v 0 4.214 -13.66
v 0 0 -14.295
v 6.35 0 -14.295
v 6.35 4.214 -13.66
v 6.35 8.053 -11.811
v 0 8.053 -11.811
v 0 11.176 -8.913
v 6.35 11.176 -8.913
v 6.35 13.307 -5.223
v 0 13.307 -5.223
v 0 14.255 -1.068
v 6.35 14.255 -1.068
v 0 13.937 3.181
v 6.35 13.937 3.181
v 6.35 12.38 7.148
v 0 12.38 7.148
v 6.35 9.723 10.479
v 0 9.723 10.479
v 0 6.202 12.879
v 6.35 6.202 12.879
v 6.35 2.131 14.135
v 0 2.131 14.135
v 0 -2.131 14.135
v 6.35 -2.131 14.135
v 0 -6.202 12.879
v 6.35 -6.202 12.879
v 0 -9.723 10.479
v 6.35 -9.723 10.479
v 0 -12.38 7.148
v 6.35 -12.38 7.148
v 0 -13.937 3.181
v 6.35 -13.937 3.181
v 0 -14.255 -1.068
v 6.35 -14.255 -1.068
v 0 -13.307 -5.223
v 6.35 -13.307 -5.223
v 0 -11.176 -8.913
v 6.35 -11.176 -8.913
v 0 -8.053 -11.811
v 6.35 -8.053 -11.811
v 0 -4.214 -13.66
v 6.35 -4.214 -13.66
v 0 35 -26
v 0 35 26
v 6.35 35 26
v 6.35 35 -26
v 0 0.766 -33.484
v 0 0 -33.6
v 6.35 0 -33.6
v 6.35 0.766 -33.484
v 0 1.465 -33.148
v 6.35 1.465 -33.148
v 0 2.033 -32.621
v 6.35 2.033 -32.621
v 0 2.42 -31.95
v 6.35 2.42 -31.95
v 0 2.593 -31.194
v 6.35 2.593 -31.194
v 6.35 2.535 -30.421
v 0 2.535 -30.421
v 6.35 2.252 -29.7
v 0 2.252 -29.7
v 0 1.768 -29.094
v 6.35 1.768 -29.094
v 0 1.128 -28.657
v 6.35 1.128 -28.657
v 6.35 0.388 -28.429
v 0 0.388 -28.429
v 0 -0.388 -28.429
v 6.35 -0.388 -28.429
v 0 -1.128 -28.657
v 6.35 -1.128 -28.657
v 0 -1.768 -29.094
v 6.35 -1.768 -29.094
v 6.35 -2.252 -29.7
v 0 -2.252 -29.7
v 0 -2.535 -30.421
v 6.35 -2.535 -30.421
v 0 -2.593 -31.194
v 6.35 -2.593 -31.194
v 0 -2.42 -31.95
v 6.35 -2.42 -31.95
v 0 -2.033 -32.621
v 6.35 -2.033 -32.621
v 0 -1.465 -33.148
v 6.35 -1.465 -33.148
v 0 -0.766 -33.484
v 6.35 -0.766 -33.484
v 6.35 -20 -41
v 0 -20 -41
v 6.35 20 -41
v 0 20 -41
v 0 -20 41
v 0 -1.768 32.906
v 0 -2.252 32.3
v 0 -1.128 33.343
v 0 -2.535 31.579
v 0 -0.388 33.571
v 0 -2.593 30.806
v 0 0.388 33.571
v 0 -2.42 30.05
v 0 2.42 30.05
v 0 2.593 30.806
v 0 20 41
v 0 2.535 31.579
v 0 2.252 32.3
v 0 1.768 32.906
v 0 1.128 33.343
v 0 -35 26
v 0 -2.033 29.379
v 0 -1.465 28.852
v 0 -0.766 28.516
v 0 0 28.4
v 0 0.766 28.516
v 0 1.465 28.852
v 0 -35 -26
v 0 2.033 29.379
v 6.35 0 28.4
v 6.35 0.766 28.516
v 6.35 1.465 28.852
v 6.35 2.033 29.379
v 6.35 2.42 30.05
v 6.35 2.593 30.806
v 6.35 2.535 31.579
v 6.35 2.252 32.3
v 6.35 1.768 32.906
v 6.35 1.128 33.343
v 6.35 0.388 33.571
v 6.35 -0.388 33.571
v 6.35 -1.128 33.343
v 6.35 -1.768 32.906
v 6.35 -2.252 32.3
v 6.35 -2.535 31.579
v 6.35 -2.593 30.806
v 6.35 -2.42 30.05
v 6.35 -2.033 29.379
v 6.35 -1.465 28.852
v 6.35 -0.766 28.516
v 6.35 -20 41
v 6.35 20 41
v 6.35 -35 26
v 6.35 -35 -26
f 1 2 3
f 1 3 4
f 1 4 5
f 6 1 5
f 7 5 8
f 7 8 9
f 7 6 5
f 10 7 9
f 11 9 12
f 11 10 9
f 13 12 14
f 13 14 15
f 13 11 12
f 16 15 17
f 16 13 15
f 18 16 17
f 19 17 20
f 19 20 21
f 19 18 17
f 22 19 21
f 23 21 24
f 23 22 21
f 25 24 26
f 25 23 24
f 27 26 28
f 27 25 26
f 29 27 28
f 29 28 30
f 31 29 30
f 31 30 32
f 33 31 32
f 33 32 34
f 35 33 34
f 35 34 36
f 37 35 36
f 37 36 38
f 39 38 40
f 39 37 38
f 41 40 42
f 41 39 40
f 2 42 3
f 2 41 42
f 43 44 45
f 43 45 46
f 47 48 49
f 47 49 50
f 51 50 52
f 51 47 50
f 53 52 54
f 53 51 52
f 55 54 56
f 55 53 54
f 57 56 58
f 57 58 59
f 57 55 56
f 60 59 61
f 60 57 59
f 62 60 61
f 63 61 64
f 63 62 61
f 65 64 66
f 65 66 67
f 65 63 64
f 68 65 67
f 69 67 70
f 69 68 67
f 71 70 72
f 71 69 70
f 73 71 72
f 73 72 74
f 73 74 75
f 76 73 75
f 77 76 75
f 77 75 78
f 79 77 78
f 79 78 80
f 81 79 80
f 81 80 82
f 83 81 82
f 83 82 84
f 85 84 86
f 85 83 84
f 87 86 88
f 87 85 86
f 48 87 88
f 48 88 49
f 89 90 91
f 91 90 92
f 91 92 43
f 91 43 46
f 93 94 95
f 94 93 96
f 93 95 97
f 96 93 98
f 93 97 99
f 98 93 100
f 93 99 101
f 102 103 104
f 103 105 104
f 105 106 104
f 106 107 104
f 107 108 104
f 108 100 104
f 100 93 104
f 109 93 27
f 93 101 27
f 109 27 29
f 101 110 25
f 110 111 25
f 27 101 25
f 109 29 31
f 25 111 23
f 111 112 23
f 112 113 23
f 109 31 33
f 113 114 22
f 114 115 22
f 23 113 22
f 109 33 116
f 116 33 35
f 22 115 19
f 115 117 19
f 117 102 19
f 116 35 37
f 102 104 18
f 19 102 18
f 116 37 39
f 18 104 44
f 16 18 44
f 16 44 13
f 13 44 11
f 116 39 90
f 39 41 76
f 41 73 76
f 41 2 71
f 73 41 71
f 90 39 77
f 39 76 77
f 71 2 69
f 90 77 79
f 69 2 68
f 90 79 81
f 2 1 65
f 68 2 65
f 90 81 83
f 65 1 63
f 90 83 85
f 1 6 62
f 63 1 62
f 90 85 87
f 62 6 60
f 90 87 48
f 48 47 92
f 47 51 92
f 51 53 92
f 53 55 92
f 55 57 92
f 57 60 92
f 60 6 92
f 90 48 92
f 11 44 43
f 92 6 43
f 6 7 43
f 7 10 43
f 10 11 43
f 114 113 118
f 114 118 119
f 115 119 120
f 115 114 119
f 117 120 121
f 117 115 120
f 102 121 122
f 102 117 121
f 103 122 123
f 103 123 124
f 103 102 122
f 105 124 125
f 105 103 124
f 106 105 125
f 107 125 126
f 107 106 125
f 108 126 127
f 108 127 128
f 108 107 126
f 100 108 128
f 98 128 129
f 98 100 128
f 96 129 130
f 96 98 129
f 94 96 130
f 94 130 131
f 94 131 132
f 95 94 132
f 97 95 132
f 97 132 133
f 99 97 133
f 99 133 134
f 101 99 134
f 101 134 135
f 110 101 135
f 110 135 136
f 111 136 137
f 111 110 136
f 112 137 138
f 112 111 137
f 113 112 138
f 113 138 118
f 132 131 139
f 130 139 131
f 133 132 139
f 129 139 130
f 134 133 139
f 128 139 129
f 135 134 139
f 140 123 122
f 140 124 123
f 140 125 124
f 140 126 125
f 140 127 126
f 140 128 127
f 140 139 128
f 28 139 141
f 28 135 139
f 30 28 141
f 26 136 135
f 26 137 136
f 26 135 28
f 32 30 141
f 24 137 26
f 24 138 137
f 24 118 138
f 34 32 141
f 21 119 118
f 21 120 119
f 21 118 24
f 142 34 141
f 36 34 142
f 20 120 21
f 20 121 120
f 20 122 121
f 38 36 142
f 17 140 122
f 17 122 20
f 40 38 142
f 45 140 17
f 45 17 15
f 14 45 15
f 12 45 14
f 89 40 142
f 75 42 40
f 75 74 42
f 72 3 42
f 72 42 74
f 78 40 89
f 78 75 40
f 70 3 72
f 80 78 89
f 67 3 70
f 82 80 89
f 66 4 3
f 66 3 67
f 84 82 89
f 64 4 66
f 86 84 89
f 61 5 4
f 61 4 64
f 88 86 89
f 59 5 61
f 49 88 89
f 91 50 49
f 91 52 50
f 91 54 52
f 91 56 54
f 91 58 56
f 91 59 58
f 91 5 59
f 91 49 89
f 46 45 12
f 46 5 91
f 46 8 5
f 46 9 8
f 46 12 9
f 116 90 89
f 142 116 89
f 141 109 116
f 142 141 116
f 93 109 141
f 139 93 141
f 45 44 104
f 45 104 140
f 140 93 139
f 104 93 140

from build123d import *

# Parameters (mm, degrees)
SKETCH1_W           = 82
SKETCH1_H           = 70
SKETCH1_R           = 14.295
SKETCH1_R_2         = 2.6
BOSS_EXTRUDE1_DEPTH = 6.35
CHAMFER1_SIZE       = 15


with BuildPart() as part:
    # Sketch1 → Boss-Extrude1 (new body)
    with BuildSketch(Plane(origin=(0, 0, 0), x_dir=(0, 0, -1), z_dir=(1, 0, 0))):
        Rectangle(SKETCH1_W, SKETCH1_H)
        Circle(SKETCH1_R, mode=Mode.SUBTRACT)
        with Locations((-31, 0)):
            Circle(SKETCH1_R_2, mode=Mode.SUBTRACT)
        with Locations((31, 0)):
            Circle(SKETCH1_R_2, mode=Mode.SUBTRACT)
    extrude(amount=BOSS_EXTRUDE1_DEPTH)

    # Chamfer1
    chamfer1_edges = [part.edges().sort_by_distance(p)[0] for p in [
        (3.175, 35, 41),
        (3.175, 35, -41),
        (3.175, -35, -41),
        (3.175, -35, 41),
    ]]
    chamfer(chamfer1_edges, length=CHAMFER1_SIZE)


solid = part.part
